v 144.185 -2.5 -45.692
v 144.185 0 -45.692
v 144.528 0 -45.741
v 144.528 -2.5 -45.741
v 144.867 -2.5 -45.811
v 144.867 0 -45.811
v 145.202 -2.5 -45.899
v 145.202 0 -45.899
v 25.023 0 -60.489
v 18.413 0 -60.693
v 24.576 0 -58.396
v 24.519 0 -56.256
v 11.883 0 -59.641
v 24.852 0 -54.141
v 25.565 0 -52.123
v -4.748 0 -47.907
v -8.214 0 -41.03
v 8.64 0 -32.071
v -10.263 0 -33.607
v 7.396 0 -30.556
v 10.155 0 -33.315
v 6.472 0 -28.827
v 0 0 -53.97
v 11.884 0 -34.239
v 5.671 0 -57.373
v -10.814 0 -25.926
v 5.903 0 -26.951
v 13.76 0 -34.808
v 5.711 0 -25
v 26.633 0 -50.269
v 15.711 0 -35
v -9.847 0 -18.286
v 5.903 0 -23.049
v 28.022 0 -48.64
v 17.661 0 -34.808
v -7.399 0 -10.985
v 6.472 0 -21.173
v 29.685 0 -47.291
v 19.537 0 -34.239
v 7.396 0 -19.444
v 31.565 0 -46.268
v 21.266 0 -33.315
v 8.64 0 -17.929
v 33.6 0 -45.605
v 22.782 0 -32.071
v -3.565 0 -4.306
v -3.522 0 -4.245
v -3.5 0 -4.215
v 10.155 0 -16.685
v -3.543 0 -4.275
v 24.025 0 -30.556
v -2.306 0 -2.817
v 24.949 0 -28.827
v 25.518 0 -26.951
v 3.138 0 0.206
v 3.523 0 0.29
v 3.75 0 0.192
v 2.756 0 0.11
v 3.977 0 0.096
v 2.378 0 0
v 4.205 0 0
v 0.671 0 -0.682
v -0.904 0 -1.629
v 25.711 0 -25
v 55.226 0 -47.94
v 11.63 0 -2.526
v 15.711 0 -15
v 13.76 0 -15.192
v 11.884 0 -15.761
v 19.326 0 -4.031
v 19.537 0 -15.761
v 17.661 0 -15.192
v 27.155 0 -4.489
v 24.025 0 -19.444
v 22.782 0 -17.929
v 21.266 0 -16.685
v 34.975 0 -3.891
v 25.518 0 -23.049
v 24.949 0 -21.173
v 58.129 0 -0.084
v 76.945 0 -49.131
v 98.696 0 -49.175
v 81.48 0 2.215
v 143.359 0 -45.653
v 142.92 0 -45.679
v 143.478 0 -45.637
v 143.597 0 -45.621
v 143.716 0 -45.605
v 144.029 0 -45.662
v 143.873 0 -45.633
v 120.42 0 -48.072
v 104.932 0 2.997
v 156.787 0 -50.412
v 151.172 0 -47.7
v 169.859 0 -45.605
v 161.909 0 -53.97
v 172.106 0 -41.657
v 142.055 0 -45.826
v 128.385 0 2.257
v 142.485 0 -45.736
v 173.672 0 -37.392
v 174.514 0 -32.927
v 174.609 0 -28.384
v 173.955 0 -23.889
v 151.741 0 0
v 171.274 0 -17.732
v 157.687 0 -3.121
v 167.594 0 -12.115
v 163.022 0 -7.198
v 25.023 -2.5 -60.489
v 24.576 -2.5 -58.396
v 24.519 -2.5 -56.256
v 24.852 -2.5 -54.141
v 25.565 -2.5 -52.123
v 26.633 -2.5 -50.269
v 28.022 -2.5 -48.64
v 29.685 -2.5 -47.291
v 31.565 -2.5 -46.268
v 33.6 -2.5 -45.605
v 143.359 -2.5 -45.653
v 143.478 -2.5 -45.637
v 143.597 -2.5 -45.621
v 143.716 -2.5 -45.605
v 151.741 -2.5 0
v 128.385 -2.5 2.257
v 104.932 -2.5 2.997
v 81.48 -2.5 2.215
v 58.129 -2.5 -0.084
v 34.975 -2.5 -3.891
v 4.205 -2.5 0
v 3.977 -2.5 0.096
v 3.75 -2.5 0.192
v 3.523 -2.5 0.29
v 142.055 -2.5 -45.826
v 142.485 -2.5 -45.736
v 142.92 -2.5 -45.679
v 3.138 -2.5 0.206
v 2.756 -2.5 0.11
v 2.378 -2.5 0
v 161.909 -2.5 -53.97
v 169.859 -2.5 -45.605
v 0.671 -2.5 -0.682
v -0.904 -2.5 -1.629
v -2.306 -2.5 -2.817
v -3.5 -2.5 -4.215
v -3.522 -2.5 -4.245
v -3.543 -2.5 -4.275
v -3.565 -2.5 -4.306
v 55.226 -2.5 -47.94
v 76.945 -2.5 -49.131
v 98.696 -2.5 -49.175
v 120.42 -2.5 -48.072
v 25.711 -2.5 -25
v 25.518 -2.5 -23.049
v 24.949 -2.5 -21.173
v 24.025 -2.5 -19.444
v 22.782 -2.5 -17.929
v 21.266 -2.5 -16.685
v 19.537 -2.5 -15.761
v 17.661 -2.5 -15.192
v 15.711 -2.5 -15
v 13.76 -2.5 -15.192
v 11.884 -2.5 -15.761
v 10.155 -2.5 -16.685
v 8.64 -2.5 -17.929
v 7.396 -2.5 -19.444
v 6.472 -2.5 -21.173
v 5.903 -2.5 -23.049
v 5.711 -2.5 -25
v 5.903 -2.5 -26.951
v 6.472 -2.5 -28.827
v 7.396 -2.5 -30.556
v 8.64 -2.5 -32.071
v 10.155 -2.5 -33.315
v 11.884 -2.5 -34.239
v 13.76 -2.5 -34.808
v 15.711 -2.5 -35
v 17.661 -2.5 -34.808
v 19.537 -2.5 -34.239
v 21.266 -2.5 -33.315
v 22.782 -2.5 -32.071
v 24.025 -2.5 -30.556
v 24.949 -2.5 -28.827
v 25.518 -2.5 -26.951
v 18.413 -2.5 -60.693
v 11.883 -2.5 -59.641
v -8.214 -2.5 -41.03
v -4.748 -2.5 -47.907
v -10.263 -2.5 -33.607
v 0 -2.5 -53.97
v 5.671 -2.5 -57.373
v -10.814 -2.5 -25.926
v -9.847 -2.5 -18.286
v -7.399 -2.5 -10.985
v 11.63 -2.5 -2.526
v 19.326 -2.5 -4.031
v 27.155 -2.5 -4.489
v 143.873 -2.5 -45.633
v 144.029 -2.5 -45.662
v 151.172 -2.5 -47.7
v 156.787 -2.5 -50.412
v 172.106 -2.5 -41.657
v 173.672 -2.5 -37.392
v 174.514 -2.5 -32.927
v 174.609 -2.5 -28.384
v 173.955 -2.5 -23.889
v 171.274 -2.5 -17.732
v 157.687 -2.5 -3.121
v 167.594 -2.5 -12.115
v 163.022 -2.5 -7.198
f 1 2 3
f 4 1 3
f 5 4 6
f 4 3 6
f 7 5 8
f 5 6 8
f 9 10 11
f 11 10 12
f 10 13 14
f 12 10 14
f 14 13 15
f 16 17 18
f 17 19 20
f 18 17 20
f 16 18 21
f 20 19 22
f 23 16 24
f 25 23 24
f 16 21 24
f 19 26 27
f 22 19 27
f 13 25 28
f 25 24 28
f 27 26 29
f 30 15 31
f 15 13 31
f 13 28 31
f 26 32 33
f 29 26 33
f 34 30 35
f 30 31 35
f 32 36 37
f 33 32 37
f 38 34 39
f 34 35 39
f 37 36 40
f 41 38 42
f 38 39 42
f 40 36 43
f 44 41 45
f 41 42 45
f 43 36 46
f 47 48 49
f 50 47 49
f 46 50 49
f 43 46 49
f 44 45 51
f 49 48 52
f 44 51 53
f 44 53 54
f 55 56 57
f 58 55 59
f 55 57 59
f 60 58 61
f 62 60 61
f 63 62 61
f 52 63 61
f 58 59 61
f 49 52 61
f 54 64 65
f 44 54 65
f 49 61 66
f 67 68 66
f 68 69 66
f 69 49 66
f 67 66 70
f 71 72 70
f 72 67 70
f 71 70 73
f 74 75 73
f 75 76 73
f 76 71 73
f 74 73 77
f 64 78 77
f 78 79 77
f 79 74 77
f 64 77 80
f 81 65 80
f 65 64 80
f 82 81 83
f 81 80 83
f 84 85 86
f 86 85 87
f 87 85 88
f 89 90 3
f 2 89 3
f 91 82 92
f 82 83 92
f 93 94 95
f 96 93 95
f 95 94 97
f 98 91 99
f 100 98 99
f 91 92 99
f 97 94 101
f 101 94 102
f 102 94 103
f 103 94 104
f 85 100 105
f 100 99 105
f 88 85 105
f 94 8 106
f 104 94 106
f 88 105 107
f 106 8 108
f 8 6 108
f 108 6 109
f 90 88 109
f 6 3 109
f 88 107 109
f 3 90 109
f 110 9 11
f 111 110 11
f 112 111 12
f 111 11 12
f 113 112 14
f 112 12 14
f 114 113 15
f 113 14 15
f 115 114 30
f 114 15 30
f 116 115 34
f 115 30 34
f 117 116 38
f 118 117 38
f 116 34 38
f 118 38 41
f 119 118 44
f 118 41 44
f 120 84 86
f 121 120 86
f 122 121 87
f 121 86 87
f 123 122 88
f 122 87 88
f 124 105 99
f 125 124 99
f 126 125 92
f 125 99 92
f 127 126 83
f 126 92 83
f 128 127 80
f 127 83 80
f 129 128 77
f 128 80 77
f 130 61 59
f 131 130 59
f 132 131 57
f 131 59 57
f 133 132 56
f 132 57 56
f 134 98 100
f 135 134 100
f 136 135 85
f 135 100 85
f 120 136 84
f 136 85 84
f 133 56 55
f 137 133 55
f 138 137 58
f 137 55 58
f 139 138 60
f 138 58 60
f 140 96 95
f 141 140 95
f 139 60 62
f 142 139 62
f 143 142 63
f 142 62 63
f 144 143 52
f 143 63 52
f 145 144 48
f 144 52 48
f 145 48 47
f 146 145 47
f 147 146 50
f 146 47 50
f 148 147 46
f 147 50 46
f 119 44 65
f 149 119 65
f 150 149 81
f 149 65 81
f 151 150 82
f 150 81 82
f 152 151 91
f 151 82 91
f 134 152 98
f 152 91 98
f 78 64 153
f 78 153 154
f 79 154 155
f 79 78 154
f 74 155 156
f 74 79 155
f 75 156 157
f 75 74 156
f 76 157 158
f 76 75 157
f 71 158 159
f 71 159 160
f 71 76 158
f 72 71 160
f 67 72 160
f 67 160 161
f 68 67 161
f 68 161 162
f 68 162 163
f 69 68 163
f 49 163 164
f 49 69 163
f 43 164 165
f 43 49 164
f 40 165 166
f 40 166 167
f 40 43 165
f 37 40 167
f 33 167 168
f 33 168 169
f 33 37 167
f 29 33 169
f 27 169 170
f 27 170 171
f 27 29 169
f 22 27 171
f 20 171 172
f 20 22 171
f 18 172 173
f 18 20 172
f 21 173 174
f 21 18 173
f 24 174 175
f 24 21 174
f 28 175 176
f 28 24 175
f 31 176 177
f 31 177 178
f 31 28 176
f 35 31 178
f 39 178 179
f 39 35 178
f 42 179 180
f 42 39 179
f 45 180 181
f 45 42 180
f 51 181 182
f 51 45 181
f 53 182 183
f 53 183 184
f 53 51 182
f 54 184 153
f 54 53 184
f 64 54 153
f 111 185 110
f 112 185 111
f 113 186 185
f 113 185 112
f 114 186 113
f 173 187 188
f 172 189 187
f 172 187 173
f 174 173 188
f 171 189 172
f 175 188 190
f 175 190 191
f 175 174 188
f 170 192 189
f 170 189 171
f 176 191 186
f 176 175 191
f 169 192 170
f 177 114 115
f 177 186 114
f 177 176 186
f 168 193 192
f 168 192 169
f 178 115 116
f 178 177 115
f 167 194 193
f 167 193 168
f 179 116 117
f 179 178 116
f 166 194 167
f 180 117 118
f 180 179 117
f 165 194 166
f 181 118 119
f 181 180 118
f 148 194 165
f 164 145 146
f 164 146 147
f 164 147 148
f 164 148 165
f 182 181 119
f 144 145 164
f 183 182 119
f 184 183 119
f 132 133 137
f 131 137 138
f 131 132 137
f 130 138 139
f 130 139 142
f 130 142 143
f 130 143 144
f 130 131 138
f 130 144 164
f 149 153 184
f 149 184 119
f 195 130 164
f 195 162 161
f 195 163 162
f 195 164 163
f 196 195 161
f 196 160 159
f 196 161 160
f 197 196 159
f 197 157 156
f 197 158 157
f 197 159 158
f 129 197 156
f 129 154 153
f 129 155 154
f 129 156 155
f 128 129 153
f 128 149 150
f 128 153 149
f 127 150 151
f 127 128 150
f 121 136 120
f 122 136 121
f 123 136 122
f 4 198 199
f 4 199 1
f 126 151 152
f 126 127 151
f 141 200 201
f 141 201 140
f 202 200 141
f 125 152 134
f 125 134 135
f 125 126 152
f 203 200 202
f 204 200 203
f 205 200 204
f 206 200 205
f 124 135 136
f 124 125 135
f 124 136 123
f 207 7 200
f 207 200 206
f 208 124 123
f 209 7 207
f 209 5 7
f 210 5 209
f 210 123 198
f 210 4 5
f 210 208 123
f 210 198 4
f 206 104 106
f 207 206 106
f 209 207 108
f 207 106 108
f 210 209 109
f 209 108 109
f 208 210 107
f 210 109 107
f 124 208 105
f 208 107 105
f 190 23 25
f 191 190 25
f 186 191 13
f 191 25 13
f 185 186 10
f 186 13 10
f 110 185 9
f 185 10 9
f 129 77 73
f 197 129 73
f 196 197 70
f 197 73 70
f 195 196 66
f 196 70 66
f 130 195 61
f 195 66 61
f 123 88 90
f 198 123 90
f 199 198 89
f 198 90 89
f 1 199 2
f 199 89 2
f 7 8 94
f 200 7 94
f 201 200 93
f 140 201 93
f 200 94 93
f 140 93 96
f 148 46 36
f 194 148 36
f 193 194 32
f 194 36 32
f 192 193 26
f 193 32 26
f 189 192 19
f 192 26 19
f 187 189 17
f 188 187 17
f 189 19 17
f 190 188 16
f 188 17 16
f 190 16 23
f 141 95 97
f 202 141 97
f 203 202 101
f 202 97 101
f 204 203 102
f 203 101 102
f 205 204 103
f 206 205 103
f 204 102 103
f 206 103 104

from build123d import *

# Parameters (mm, degrees)
F0_R     = 10
F1_DEPTH = 2.5


# Not quite as in the source:
# - a feature names something its author has since deleted; it is built from what else it names


with BuildPart() as f1:
    # F0 (on Front) → F1 (new body)
    with BuildSketch(Plane.XZ):
        with BuildLine():
            ThreePointArc((3.5229699651, 0.2896982716), (2.9467535756, 0.1596707418), (2.3780377062, 0))
            Line((2.3780377062, 0), (4.205058077, 0))
            ThreePointArc((4.205058077, 0), (3.8635532968, 0.1437643709), (3.5229699651, 0.2896982716))
        make_face()
        with BuildLine():
            Line((4.205058077, 0), (2.3780377062, 0))
            ThreePointArc((2.3780377062, 0), (-0.903638288, -1.6292874632), (-3.4998361796, -4.2145788348))
            ThreePointArc((-3.4998361796, -4.2145788348), (-3.5325783371, -4.260242238), (-3.5652547335, -4.3059527224))
            ThreePointArc((-3.5652547335, -4.3059527224), (-10.7285361122, -29.7799444124), (0, -53.9695158351))
            ThreePointArc((0, -53.9695158351), (11.8831829855, -59.6411390335), (25.0231431088, -60.4889571322))
            ThreePointArc((25.0231431088, -60.4889571322), (26.0566140951, -51.1714178585), (33.5999478712, -45.6052058665))
            ThreePointArc((33.5999478712, -45.6052058665), (87.8201274571, -49.2962363), (142.0548581476, -45.8255638994))
            ThreePointArc((142.0548581476, -45.8255638994), (142.7021149729, -45.7037001136), (143.3588035872, -45.6531803752))
            ThreePointArc((143.3588035872, -45.6531803752), (143.5374590966, -45.629232164), (143.7161041215, -45.6052058665))
            ThreePointArc((143.7161041215, -45.6052058665), (143.95071498, -45.6477329831), (144.1850665045, -45.6916667233))
            ThreePointArc((144.1850665045, -45.6916667233), (144.6977602251, -45.7735054296), (145.2015099012, -45.899158479))
            ThreePointArc((145.2015099012, -45.899158479), (154.032538738, -48.9458086752), (161.9085475054, -53.9695158351))
            Line((161.9085475054, -53.9695158351), (169.8591839037, -45.6052058665))
            ThreePointArc((169.8591839037, -45.6052058665), (174.1858351689, -35.1766319754), (173.9545511242, -23.8885155575))
            ThreePointArc((173.9545511242, -23.8885155575), (165.4122565919, -9.5597842761), (151.7413436521, 0))
            ThreePointArc((151.7413436521, 0), (93.1999930381, 2.7960741366), (34.9746532738, -3.8910456933))
            ThreePointArc((34.9746532738, -3.8910456933), (19.3261135001, -4.0311421401), (4.205058077, 0))
        make_face()
        with Locations((15.7105848193, -25)):
            Circle(F0_R, mode=Mode.SUBTRACT)
    extrude(amount=F1_DEPTH)


solid = f1.part
